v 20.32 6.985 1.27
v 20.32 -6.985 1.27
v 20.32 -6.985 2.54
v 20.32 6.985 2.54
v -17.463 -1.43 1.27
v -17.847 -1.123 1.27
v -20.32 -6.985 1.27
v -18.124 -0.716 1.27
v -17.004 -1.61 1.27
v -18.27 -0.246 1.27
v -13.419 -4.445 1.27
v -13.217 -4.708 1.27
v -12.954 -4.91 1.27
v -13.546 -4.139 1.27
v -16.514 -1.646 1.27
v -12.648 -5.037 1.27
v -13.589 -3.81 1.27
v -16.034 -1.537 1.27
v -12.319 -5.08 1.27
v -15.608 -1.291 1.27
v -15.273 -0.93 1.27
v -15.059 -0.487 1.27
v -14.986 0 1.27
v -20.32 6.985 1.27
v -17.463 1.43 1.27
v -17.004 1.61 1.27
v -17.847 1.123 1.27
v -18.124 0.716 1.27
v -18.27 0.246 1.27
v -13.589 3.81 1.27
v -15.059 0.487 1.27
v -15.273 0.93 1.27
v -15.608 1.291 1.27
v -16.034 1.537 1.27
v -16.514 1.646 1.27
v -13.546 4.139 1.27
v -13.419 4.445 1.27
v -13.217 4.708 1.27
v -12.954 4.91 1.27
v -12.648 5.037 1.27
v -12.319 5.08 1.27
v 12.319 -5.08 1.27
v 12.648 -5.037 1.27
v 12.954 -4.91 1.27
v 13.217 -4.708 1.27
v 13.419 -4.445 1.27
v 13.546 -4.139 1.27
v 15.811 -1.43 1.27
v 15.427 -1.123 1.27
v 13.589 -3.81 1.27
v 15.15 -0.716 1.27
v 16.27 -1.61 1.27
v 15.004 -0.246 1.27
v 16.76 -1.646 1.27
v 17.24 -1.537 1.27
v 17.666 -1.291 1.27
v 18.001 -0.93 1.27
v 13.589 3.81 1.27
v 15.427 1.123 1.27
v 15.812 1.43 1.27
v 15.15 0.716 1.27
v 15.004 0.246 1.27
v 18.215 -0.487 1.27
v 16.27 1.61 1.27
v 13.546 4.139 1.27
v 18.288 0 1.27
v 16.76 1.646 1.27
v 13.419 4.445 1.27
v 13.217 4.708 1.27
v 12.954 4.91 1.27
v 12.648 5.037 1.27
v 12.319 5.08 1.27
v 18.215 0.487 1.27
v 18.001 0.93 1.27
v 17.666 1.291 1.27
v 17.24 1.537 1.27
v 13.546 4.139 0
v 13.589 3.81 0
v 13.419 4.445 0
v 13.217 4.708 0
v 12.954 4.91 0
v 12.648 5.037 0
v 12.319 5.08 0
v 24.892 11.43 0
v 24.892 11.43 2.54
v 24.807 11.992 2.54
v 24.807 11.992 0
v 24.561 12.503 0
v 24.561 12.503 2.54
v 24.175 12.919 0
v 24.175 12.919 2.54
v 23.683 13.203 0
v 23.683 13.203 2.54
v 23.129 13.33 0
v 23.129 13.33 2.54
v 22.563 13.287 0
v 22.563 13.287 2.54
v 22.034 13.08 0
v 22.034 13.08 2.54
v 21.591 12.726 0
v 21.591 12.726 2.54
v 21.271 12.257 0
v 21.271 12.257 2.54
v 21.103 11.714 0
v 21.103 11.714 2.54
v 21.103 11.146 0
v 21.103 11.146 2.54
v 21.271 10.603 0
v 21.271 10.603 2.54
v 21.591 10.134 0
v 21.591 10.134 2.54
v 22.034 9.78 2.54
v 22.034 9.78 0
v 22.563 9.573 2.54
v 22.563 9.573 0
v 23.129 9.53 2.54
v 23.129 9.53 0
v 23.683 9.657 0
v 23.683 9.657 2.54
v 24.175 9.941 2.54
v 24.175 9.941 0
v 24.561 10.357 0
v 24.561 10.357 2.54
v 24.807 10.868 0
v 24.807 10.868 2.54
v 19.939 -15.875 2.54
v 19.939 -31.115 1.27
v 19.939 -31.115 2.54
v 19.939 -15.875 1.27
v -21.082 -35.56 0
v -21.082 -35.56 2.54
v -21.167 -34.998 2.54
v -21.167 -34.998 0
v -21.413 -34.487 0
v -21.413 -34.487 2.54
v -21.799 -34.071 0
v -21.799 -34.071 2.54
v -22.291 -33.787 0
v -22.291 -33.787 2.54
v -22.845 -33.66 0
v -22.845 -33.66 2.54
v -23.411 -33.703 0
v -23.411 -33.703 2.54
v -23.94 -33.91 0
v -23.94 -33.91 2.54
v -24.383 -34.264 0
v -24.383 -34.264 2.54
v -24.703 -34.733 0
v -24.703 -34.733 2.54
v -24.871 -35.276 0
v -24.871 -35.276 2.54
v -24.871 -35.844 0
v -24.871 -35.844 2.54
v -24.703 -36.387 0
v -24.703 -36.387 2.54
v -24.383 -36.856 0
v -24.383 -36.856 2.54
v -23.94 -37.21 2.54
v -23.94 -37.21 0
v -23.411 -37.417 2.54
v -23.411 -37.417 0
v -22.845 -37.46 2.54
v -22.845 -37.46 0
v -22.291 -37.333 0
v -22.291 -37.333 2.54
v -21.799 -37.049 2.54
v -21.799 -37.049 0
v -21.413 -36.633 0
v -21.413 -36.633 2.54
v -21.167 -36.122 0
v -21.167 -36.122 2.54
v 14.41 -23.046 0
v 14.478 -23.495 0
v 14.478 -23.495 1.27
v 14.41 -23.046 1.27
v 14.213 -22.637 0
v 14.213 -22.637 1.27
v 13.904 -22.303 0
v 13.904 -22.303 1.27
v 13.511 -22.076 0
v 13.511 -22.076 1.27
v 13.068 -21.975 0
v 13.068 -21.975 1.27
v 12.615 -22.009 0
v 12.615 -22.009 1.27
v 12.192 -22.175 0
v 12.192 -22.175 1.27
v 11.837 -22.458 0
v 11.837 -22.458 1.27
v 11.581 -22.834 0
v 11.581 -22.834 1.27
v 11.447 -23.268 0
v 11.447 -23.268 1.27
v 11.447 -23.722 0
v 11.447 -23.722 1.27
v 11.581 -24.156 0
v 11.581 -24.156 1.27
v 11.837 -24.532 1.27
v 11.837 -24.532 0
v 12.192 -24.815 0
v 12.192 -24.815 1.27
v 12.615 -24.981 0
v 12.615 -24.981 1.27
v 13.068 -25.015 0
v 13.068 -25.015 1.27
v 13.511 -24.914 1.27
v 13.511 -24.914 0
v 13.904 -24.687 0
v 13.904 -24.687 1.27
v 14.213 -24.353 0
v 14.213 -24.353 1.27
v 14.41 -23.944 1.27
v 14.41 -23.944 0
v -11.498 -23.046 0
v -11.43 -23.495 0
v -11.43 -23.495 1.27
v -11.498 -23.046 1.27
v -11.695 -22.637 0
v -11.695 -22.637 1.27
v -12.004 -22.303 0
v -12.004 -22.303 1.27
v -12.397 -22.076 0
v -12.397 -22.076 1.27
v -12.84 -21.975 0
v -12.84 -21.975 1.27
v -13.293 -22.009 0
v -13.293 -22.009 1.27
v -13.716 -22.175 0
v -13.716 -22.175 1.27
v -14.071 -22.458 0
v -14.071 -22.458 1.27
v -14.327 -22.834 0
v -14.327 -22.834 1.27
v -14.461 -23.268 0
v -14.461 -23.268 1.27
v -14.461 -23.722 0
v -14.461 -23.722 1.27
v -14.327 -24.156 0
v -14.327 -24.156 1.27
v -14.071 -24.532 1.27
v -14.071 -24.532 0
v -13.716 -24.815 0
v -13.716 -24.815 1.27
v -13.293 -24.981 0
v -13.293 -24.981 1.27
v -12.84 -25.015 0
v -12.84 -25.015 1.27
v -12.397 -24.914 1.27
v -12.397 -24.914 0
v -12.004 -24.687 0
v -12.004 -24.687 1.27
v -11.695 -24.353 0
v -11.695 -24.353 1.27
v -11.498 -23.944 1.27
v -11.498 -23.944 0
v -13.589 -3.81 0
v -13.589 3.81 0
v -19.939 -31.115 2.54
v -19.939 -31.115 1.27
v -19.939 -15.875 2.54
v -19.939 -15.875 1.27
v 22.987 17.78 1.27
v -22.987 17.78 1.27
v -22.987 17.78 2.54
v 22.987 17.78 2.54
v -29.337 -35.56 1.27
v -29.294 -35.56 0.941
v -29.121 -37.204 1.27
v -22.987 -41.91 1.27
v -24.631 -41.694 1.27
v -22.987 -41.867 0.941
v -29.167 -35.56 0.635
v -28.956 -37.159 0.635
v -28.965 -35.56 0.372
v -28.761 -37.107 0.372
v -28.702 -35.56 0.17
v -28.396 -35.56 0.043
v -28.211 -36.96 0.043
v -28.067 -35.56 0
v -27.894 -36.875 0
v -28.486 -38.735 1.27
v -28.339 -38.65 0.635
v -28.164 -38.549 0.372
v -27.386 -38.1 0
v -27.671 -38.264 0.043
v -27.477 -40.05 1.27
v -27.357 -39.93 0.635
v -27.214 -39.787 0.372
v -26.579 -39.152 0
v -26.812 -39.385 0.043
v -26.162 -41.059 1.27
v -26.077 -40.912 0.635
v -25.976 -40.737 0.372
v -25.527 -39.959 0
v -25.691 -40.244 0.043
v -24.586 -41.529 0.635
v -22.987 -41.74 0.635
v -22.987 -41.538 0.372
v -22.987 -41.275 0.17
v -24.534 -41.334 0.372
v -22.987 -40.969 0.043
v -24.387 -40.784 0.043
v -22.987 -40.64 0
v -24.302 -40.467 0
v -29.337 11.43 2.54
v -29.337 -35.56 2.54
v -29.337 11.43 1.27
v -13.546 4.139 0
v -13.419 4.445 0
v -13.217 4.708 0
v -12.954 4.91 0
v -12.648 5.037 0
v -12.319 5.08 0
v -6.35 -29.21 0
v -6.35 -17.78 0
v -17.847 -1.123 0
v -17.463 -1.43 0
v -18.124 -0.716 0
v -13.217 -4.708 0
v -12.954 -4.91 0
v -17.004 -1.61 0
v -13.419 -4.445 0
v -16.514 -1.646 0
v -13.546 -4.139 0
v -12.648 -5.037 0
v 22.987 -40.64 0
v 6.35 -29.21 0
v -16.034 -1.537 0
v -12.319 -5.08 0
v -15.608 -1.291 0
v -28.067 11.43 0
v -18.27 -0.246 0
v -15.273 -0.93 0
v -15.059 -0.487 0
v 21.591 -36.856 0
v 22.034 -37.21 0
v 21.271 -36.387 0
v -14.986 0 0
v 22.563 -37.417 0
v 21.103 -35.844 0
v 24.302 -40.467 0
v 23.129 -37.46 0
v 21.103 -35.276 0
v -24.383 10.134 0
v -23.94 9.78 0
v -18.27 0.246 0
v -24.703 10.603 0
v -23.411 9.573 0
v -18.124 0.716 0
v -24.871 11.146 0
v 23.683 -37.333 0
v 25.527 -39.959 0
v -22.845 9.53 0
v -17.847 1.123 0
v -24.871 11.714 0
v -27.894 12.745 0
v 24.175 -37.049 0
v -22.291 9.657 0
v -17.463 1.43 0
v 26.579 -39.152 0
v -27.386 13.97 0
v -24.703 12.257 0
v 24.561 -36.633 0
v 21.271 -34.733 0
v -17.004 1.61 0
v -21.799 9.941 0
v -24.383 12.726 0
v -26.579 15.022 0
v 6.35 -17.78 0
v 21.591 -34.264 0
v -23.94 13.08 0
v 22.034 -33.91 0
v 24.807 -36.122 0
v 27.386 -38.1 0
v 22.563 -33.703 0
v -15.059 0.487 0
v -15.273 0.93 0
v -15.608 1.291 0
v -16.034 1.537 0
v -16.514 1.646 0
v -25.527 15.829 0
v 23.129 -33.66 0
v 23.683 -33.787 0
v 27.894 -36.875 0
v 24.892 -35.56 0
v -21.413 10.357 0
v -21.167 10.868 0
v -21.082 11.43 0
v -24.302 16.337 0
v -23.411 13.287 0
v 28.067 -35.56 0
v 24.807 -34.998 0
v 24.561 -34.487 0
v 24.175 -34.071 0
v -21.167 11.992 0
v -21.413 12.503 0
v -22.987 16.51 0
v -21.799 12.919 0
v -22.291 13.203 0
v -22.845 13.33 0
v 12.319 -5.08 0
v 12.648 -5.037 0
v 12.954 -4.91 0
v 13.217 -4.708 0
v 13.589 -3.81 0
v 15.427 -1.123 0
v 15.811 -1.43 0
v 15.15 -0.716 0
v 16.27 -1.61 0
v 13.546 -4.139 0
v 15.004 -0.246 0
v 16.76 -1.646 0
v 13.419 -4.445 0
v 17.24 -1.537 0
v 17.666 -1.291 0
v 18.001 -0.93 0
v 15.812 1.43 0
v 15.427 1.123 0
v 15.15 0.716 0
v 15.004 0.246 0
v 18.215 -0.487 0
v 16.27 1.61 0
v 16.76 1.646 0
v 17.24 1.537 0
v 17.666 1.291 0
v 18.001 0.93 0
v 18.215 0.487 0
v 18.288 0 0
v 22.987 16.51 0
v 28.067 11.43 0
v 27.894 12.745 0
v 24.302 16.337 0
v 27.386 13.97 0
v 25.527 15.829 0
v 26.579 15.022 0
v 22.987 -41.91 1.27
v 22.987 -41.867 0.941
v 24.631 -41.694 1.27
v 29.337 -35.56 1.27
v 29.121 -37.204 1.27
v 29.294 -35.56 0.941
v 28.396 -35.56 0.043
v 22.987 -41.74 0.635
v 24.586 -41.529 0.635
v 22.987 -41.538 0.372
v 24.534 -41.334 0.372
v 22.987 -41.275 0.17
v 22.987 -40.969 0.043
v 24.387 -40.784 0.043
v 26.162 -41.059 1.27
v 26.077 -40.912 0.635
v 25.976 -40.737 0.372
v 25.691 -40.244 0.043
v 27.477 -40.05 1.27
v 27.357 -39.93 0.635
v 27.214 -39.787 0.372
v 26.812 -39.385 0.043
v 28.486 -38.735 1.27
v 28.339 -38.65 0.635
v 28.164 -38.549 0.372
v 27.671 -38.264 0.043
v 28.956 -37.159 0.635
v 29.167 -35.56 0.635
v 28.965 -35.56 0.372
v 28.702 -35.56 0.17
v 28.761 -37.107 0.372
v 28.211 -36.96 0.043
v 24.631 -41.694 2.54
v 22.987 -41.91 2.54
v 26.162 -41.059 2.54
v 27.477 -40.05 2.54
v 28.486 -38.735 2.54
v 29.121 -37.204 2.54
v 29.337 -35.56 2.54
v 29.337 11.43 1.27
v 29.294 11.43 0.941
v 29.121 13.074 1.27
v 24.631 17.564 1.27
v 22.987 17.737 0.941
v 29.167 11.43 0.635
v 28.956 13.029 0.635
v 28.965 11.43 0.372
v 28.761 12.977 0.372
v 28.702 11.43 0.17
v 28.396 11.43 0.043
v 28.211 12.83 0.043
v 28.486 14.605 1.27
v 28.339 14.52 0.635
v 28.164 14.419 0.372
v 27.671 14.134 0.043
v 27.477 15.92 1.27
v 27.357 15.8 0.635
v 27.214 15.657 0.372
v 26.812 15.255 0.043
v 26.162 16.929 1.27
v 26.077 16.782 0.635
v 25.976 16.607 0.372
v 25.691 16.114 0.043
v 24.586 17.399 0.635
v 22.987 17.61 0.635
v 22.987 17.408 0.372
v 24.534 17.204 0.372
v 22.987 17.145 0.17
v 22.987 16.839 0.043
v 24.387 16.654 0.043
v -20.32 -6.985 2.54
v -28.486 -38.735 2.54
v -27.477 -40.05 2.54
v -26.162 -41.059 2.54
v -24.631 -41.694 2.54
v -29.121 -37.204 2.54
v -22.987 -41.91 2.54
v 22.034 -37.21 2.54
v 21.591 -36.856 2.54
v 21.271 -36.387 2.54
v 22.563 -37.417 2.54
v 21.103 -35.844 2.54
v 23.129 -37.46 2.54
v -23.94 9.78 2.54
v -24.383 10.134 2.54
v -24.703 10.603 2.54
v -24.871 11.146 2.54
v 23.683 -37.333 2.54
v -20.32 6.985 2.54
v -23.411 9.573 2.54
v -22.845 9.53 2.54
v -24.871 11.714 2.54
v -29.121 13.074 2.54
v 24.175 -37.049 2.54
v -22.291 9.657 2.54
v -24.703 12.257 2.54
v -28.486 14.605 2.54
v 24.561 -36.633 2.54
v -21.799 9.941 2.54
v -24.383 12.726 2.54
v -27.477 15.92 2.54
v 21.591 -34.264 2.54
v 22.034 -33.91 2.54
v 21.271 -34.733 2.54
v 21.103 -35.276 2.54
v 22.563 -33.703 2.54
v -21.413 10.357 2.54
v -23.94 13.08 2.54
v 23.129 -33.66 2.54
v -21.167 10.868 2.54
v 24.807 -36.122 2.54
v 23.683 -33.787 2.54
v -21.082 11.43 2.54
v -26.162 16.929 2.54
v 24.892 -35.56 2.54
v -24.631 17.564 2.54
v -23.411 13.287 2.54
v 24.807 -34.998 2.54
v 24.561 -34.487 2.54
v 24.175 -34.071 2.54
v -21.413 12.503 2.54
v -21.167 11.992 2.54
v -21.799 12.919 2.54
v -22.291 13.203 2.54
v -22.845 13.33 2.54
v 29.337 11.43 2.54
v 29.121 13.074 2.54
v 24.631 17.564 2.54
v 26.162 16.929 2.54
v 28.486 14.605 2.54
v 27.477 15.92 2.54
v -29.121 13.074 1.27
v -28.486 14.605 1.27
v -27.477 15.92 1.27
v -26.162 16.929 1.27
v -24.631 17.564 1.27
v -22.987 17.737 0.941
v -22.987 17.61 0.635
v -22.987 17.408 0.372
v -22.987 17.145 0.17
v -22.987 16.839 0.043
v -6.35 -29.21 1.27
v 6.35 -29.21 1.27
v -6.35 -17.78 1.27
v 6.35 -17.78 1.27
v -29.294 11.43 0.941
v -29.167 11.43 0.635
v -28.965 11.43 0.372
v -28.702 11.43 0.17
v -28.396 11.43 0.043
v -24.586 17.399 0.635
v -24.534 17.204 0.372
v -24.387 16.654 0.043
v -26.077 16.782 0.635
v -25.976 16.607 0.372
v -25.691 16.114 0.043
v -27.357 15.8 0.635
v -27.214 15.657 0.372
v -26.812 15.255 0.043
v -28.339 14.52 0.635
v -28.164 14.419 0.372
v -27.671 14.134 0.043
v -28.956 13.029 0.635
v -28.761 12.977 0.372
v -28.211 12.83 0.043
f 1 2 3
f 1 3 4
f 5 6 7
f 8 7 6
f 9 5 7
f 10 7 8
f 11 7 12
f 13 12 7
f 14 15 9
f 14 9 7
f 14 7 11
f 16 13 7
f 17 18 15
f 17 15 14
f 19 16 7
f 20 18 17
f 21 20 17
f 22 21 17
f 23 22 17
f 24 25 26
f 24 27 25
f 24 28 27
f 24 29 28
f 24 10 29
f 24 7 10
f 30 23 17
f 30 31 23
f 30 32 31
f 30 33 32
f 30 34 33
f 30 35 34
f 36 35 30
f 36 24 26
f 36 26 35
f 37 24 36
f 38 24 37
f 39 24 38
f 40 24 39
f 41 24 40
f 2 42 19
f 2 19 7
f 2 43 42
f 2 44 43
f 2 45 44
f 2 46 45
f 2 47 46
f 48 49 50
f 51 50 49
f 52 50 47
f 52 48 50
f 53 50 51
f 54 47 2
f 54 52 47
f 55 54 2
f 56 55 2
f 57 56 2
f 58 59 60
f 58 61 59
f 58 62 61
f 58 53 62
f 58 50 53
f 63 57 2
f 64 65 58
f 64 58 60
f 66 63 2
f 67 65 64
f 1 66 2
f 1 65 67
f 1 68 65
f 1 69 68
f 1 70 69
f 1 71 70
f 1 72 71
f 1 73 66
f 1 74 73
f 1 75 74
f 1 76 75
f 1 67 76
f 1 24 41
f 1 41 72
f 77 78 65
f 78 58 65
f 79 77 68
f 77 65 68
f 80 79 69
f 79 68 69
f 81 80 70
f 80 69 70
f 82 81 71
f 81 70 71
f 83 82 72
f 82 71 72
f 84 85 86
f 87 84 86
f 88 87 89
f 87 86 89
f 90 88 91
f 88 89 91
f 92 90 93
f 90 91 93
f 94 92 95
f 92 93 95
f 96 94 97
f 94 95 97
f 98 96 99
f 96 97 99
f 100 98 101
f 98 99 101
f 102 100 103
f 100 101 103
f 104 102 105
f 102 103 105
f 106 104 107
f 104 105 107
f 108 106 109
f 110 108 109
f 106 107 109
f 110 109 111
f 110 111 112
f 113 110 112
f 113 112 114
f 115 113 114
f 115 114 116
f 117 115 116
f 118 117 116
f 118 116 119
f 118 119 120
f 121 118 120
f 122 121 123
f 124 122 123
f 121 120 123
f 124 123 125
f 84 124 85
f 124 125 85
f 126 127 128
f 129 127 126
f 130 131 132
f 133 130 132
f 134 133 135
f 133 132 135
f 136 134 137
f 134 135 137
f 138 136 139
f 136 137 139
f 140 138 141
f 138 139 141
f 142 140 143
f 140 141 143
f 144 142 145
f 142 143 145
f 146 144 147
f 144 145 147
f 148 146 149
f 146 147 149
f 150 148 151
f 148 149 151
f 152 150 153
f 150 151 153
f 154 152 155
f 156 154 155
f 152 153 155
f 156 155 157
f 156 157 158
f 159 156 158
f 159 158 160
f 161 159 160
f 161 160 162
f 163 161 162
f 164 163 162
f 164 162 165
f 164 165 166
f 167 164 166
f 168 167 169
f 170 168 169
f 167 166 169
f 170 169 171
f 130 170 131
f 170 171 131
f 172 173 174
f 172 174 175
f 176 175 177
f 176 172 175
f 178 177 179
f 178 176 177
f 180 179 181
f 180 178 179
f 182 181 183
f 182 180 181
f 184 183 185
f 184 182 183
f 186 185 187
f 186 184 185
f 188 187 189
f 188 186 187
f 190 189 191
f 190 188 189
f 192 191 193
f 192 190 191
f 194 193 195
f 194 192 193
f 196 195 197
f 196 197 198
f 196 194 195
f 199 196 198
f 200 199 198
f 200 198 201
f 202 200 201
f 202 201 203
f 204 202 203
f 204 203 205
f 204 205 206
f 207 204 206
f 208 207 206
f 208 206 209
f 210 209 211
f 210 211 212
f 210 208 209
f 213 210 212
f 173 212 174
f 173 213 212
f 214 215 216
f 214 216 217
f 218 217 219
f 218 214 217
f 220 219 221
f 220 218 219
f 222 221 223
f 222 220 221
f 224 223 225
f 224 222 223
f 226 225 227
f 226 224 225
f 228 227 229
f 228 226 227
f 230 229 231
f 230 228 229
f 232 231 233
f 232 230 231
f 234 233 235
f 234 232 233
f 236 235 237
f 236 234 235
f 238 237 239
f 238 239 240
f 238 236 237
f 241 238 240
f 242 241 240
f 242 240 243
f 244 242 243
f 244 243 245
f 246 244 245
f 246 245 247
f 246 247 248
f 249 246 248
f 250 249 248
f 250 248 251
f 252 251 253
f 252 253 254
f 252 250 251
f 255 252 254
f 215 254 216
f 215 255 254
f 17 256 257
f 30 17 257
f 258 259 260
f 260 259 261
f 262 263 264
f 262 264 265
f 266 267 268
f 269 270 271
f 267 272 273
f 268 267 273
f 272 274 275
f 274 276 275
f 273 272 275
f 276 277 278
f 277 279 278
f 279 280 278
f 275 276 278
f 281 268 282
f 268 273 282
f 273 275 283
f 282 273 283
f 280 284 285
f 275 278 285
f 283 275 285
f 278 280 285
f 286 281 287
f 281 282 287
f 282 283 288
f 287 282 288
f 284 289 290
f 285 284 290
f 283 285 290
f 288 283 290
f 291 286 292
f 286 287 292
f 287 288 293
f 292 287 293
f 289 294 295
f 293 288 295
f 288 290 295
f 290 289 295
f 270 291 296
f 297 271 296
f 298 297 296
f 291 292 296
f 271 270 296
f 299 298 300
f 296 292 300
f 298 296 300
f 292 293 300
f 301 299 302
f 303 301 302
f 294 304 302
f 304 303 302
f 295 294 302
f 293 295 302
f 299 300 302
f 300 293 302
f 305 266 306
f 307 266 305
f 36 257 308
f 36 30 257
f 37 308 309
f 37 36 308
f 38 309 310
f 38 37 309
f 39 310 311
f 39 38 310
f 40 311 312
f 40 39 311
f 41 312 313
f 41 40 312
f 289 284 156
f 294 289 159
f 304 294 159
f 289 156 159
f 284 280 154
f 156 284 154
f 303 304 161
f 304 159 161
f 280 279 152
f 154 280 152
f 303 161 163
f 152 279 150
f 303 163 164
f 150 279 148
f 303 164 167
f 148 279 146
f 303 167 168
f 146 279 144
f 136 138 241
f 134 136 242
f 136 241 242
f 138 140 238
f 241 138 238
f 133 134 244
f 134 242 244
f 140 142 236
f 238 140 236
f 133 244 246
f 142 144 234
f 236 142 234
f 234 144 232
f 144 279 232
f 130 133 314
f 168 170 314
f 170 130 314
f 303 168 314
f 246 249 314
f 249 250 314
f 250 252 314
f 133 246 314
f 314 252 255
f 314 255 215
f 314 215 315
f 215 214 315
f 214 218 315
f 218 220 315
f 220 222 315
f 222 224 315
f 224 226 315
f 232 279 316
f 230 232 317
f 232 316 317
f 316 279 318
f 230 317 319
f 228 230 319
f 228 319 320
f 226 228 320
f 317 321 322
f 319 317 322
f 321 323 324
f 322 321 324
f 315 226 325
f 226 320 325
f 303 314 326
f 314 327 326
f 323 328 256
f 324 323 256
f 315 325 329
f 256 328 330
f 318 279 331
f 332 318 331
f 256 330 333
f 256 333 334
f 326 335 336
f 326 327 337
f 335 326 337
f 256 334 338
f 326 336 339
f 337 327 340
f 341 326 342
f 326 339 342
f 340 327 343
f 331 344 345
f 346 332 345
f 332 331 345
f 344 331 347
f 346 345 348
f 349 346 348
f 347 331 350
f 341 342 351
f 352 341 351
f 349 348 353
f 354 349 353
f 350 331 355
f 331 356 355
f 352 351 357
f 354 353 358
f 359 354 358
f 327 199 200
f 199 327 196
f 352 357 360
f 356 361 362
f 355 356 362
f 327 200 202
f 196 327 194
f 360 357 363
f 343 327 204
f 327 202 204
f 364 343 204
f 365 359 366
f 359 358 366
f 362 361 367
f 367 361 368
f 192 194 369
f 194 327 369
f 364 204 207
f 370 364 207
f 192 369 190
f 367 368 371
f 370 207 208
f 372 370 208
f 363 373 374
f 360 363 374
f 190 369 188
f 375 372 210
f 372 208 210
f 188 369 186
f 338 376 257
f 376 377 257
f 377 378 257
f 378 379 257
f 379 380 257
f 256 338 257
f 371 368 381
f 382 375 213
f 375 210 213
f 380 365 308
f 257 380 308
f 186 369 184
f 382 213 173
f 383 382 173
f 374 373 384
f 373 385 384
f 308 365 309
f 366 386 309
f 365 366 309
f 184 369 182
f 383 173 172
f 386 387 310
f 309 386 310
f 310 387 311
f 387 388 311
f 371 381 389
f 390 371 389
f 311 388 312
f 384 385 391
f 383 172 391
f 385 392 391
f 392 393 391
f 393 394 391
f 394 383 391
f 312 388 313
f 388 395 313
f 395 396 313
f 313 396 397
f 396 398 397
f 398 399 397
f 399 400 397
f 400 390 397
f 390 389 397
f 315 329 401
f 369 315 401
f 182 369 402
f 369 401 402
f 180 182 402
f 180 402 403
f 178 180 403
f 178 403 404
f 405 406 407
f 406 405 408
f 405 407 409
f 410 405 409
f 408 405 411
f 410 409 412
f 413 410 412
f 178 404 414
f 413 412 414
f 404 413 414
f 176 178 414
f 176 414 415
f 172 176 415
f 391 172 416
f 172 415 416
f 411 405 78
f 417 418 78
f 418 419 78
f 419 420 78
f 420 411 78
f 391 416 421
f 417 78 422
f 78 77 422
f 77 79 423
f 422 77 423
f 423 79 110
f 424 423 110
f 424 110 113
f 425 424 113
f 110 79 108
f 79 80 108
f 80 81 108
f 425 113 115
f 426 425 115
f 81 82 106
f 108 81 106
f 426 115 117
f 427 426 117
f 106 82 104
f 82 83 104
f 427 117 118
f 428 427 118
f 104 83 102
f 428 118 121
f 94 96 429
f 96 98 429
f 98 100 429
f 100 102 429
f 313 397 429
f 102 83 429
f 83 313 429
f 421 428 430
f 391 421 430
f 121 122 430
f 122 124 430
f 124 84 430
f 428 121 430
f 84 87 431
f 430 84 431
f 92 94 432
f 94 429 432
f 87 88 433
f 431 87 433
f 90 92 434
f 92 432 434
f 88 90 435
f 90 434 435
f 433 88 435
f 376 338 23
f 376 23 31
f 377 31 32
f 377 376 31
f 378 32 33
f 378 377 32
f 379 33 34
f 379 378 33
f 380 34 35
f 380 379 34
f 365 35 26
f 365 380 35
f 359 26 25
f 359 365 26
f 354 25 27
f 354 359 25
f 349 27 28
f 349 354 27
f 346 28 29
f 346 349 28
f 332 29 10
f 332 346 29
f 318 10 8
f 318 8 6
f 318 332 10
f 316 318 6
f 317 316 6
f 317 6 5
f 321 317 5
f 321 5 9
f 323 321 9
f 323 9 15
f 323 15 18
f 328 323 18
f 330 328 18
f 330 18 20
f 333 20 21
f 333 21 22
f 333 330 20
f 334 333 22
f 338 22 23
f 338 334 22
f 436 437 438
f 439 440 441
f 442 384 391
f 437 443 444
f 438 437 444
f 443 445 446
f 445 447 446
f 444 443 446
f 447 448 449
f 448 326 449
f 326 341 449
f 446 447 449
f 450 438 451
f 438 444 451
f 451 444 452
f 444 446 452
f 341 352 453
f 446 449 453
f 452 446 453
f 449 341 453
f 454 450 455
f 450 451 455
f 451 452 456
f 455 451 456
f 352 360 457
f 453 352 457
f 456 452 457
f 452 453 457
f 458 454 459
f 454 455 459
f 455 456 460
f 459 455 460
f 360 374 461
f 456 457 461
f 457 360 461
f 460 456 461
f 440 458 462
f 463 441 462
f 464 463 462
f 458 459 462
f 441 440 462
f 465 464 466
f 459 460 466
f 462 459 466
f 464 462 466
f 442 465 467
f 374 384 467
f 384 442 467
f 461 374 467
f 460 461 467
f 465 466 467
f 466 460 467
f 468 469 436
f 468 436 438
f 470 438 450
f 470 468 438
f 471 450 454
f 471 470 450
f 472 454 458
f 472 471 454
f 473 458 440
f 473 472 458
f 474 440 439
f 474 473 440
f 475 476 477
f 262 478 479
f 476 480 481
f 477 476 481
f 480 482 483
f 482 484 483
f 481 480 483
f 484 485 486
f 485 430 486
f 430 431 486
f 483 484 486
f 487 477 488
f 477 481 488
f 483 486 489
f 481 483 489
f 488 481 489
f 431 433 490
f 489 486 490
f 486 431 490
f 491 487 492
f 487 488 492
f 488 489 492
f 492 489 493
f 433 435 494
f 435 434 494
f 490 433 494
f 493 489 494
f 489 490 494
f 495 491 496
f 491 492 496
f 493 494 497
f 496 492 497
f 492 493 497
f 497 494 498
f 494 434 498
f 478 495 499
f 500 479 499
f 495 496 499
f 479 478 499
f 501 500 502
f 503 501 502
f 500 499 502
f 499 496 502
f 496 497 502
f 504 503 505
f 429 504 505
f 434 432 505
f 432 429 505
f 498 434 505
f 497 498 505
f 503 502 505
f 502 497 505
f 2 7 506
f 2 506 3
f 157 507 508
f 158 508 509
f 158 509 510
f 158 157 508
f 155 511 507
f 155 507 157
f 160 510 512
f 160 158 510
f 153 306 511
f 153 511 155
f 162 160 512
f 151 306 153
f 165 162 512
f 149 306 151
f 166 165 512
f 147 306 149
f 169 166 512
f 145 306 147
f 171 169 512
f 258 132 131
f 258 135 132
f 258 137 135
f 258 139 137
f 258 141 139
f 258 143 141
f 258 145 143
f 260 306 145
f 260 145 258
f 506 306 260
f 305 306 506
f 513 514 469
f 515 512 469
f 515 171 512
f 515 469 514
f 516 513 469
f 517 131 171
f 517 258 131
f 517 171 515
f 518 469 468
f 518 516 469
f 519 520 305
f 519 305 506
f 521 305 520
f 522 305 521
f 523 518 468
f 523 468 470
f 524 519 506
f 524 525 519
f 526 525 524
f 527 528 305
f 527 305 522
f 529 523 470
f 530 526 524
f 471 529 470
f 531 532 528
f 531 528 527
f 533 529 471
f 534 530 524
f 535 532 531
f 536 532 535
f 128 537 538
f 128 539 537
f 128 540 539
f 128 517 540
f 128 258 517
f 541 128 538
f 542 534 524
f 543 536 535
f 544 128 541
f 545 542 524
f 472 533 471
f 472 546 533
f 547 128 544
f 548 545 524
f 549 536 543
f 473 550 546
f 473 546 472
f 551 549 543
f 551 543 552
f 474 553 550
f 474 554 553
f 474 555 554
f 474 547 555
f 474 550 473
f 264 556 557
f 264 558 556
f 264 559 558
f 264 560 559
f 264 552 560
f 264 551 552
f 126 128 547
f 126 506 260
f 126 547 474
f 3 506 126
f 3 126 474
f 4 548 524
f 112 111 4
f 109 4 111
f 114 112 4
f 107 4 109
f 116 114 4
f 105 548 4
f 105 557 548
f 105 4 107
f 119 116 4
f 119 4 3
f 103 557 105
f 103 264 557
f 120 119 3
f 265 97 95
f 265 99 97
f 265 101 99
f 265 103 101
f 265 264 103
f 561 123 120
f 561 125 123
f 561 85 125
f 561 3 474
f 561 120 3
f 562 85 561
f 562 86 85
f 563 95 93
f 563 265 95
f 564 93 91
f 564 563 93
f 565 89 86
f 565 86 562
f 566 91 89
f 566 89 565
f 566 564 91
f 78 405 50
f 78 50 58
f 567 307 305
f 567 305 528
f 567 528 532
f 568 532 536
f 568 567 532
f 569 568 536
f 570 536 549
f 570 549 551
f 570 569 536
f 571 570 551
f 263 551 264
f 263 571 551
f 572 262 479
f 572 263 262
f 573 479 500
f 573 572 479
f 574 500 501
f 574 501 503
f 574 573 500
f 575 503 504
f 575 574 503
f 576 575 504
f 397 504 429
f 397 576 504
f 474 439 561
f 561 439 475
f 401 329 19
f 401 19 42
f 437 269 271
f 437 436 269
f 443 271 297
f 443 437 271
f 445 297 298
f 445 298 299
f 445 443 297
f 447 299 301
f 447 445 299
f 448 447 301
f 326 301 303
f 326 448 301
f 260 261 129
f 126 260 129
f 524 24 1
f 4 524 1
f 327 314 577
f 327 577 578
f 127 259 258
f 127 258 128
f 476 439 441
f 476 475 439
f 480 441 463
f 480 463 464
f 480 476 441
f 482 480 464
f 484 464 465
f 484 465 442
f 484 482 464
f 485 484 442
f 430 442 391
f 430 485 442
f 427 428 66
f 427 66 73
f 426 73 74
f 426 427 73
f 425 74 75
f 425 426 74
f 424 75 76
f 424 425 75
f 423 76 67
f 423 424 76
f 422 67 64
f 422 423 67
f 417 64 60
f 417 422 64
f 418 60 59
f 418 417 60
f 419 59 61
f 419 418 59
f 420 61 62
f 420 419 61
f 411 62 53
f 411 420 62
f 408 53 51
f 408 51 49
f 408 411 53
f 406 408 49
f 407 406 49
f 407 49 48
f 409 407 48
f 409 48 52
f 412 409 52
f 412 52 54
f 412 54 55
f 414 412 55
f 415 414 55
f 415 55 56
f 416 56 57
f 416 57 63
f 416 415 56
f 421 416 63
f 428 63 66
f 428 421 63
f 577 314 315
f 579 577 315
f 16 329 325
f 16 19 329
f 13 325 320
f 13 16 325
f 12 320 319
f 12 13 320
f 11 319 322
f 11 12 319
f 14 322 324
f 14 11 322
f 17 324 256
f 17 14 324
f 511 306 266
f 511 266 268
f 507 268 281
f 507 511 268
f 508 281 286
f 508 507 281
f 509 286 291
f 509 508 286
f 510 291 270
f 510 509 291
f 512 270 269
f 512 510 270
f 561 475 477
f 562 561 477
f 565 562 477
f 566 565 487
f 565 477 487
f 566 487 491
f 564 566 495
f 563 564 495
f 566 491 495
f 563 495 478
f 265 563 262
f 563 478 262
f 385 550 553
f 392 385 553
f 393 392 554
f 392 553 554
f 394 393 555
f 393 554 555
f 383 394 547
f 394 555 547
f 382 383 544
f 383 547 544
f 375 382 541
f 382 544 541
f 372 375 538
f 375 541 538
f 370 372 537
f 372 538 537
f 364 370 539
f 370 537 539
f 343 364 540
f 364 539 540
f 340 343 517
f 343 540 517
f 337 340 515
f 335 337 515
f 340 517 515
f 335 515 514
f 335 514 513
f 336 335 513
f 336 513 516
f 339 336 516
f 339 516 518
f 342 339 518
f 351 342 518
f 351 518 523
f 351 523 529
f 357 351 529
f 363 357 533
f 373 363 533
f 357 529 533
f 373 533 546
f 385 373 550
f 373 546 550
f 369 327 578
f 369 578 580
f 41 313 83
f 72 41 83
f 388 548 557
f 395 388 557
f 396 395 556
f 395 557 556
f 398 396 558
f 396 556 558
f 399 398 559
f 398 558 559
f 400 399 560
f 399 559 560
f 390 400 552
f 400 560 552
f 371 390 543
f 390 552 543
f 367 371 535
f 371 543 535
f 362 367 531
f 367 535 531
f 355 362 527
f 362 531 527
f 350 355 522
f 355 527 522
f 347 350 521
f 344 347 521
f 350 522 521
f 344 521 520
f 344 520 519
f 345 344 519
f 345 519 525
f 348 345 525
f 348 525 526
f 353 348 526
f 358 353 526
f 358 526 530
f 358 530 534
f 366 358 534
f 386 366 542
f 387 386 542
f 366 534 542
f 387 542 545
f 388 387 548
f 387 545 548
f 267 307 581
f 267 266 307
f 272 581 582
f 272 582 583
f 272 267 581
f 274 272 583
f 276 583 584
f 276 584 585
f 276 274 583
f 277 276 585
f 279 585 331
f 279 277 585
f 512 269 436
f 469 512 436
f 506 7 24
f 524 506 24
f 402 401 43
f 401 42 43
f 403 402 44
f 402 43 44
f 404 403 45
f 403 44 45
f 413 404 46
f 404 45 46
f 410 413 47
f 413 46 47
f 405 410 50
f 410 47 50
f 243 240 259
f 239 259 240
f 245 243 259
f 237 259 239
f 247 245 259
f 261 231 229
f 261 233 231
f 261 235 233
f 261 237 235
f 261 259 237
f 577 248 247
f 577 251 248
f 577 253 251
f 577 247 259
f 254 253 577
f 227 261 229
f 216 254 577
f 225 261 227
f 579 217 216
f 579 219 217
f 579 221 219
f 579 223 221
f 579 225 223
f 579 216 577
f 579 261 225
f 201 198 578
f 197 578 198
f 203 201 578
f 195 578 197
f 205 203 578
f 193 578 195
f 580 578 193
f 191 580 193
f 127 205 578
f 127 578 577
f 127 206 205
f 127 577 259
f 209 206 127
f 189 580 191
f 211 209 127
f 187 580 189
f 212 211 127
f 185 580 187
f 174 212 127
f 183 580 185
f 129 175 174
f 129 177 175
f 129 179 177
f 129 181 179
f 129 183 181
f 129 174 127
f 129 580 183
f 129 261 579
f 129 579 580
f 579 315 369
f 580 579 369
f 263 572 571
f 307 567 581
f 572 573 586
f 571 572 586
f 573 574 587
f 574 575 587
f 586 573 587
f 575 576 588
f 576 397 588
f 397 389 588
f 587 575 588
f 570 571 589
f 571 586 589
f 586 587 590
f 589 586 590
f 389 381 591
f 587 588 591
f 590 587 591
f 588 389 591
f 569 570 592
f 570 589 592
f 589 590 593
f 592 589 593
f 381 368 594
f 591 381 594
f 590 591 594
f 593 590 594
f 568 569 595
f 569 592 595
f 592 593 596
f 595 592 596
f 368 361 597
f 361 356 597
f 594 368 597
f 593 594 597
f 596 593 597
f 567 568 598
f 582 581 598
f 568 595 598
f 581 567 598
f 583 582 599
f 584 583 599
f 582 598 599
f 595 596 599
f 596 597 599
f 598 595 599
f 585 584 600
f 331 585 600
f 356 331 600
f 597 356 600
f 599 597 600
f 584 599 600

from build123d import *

# Parameters (mm, degrees)
F0_W     = 58.674
F0_H     = 59.69
F0_R     = 1.524
F0_W_2   = 12.7
F0_H_2   = 11.43
F0_R_2   = 1.651
F0_W_3   = 27.178
F0_H_3   = 10.16
F1_DEPTH = 1.27
F2_W     = 58.674
F2_H     = 59.69
F2_W_2   = 39.878
F2_H_2   = 15.24
F2_W_3   = 40.64
F2_H_3   = 13.97
F3_DEPTH = 1.27
F4_R     = 6.35
F5_R     = 1.27
F6_R     = 1.905
F7_DEPTH = 2.54


with BuildPart() as f1:
    # F0 (on Top) → F1 (new body)
    with BuildSketch(Plane.XY):
        with Locations((0, -12.065)):
            Rectangle(F0_W, F0_H)
        with Locations((-12.954, -23.495)):
            Circle(F0_R, mode=Mode.SUBTRACT)
        with Locations((0, -23.495)):
            Rectangle(F0_W_2, F0_H_2, mode=Mode.SUBTRACT)
        with Locations((12.954, -23.495)):
            Circle(F0_R, mode=Mode.SUBTRACT)
        with Locations((-16.637, 0)):
            Circle(F0_R_2, mode=Mode.SUBTRACT)
        Rectangle(F0_W_3, F0_H_3, mode=Mode.SUBTRACT)
        with Locations((16.637, 0)):
            Circle(F0_R_2, mode=Mode.SUBTRACT)
    extrude(amount=F1_DEPTH)

    # F2 (on face) → F3 (join)
    with BuildSketch(Plane.XY.offset(1.27)):
        with Locations((0, -12.065)):
            Rectangle(F2_W, F2_H)
        with Locations((0, -23.495)):
            Rectangle(F2_W_2, F2_H_2, mode=Mode.SUBTRACT)
        Rectangle(F2_W_3, F2_H_3, mode=Mode.SUBTRACT)
    extrude(amount=F3_DEPTH)

    # F4
    f4_edges = [f1.edges().sort_by_distance(p)[0] for p in [
        (-29.337, -41.91, 1.27),
        (29.337, 17.78, 1.27),
        (29.337, -41.91, 1.27),
        (-29.337, 17.78, 1.27),
    ]]
    fillet(f4_edges, radius=F4_R)

    # F5
    f5_edges = [f1.edges().sort_by_distance(p)[0] for p in [
        (-27.477128, -40.050128, 0),
        (-13.589, 5.08, 0.635),
        (-13.589, -5.08, 0.635),
        (13.589, -5.08, 0.635),
        (13.589, 5.08, 0.635),
    ]]
    fillet(f5_edges, radius=F5_R)

    # F6 (on face) → F7 (cut, through all)
    with BuildSketch(Plane.XY.offset(2.54)):
        with Locations((-22.987, 11.43)):
            Circle(F6_R)
        with Locations((22.987, 11.43)):
            Circle(F6_R)
        with Locations((22.987, -35.56)):
            Circle(F6_R)
        with Locations((-22.987, -35.56)):
            Circle(F6_R)
    extrude(amount=-F7_DEPTH, mode=Mode.SUBTRACT)


solid = f1.part
